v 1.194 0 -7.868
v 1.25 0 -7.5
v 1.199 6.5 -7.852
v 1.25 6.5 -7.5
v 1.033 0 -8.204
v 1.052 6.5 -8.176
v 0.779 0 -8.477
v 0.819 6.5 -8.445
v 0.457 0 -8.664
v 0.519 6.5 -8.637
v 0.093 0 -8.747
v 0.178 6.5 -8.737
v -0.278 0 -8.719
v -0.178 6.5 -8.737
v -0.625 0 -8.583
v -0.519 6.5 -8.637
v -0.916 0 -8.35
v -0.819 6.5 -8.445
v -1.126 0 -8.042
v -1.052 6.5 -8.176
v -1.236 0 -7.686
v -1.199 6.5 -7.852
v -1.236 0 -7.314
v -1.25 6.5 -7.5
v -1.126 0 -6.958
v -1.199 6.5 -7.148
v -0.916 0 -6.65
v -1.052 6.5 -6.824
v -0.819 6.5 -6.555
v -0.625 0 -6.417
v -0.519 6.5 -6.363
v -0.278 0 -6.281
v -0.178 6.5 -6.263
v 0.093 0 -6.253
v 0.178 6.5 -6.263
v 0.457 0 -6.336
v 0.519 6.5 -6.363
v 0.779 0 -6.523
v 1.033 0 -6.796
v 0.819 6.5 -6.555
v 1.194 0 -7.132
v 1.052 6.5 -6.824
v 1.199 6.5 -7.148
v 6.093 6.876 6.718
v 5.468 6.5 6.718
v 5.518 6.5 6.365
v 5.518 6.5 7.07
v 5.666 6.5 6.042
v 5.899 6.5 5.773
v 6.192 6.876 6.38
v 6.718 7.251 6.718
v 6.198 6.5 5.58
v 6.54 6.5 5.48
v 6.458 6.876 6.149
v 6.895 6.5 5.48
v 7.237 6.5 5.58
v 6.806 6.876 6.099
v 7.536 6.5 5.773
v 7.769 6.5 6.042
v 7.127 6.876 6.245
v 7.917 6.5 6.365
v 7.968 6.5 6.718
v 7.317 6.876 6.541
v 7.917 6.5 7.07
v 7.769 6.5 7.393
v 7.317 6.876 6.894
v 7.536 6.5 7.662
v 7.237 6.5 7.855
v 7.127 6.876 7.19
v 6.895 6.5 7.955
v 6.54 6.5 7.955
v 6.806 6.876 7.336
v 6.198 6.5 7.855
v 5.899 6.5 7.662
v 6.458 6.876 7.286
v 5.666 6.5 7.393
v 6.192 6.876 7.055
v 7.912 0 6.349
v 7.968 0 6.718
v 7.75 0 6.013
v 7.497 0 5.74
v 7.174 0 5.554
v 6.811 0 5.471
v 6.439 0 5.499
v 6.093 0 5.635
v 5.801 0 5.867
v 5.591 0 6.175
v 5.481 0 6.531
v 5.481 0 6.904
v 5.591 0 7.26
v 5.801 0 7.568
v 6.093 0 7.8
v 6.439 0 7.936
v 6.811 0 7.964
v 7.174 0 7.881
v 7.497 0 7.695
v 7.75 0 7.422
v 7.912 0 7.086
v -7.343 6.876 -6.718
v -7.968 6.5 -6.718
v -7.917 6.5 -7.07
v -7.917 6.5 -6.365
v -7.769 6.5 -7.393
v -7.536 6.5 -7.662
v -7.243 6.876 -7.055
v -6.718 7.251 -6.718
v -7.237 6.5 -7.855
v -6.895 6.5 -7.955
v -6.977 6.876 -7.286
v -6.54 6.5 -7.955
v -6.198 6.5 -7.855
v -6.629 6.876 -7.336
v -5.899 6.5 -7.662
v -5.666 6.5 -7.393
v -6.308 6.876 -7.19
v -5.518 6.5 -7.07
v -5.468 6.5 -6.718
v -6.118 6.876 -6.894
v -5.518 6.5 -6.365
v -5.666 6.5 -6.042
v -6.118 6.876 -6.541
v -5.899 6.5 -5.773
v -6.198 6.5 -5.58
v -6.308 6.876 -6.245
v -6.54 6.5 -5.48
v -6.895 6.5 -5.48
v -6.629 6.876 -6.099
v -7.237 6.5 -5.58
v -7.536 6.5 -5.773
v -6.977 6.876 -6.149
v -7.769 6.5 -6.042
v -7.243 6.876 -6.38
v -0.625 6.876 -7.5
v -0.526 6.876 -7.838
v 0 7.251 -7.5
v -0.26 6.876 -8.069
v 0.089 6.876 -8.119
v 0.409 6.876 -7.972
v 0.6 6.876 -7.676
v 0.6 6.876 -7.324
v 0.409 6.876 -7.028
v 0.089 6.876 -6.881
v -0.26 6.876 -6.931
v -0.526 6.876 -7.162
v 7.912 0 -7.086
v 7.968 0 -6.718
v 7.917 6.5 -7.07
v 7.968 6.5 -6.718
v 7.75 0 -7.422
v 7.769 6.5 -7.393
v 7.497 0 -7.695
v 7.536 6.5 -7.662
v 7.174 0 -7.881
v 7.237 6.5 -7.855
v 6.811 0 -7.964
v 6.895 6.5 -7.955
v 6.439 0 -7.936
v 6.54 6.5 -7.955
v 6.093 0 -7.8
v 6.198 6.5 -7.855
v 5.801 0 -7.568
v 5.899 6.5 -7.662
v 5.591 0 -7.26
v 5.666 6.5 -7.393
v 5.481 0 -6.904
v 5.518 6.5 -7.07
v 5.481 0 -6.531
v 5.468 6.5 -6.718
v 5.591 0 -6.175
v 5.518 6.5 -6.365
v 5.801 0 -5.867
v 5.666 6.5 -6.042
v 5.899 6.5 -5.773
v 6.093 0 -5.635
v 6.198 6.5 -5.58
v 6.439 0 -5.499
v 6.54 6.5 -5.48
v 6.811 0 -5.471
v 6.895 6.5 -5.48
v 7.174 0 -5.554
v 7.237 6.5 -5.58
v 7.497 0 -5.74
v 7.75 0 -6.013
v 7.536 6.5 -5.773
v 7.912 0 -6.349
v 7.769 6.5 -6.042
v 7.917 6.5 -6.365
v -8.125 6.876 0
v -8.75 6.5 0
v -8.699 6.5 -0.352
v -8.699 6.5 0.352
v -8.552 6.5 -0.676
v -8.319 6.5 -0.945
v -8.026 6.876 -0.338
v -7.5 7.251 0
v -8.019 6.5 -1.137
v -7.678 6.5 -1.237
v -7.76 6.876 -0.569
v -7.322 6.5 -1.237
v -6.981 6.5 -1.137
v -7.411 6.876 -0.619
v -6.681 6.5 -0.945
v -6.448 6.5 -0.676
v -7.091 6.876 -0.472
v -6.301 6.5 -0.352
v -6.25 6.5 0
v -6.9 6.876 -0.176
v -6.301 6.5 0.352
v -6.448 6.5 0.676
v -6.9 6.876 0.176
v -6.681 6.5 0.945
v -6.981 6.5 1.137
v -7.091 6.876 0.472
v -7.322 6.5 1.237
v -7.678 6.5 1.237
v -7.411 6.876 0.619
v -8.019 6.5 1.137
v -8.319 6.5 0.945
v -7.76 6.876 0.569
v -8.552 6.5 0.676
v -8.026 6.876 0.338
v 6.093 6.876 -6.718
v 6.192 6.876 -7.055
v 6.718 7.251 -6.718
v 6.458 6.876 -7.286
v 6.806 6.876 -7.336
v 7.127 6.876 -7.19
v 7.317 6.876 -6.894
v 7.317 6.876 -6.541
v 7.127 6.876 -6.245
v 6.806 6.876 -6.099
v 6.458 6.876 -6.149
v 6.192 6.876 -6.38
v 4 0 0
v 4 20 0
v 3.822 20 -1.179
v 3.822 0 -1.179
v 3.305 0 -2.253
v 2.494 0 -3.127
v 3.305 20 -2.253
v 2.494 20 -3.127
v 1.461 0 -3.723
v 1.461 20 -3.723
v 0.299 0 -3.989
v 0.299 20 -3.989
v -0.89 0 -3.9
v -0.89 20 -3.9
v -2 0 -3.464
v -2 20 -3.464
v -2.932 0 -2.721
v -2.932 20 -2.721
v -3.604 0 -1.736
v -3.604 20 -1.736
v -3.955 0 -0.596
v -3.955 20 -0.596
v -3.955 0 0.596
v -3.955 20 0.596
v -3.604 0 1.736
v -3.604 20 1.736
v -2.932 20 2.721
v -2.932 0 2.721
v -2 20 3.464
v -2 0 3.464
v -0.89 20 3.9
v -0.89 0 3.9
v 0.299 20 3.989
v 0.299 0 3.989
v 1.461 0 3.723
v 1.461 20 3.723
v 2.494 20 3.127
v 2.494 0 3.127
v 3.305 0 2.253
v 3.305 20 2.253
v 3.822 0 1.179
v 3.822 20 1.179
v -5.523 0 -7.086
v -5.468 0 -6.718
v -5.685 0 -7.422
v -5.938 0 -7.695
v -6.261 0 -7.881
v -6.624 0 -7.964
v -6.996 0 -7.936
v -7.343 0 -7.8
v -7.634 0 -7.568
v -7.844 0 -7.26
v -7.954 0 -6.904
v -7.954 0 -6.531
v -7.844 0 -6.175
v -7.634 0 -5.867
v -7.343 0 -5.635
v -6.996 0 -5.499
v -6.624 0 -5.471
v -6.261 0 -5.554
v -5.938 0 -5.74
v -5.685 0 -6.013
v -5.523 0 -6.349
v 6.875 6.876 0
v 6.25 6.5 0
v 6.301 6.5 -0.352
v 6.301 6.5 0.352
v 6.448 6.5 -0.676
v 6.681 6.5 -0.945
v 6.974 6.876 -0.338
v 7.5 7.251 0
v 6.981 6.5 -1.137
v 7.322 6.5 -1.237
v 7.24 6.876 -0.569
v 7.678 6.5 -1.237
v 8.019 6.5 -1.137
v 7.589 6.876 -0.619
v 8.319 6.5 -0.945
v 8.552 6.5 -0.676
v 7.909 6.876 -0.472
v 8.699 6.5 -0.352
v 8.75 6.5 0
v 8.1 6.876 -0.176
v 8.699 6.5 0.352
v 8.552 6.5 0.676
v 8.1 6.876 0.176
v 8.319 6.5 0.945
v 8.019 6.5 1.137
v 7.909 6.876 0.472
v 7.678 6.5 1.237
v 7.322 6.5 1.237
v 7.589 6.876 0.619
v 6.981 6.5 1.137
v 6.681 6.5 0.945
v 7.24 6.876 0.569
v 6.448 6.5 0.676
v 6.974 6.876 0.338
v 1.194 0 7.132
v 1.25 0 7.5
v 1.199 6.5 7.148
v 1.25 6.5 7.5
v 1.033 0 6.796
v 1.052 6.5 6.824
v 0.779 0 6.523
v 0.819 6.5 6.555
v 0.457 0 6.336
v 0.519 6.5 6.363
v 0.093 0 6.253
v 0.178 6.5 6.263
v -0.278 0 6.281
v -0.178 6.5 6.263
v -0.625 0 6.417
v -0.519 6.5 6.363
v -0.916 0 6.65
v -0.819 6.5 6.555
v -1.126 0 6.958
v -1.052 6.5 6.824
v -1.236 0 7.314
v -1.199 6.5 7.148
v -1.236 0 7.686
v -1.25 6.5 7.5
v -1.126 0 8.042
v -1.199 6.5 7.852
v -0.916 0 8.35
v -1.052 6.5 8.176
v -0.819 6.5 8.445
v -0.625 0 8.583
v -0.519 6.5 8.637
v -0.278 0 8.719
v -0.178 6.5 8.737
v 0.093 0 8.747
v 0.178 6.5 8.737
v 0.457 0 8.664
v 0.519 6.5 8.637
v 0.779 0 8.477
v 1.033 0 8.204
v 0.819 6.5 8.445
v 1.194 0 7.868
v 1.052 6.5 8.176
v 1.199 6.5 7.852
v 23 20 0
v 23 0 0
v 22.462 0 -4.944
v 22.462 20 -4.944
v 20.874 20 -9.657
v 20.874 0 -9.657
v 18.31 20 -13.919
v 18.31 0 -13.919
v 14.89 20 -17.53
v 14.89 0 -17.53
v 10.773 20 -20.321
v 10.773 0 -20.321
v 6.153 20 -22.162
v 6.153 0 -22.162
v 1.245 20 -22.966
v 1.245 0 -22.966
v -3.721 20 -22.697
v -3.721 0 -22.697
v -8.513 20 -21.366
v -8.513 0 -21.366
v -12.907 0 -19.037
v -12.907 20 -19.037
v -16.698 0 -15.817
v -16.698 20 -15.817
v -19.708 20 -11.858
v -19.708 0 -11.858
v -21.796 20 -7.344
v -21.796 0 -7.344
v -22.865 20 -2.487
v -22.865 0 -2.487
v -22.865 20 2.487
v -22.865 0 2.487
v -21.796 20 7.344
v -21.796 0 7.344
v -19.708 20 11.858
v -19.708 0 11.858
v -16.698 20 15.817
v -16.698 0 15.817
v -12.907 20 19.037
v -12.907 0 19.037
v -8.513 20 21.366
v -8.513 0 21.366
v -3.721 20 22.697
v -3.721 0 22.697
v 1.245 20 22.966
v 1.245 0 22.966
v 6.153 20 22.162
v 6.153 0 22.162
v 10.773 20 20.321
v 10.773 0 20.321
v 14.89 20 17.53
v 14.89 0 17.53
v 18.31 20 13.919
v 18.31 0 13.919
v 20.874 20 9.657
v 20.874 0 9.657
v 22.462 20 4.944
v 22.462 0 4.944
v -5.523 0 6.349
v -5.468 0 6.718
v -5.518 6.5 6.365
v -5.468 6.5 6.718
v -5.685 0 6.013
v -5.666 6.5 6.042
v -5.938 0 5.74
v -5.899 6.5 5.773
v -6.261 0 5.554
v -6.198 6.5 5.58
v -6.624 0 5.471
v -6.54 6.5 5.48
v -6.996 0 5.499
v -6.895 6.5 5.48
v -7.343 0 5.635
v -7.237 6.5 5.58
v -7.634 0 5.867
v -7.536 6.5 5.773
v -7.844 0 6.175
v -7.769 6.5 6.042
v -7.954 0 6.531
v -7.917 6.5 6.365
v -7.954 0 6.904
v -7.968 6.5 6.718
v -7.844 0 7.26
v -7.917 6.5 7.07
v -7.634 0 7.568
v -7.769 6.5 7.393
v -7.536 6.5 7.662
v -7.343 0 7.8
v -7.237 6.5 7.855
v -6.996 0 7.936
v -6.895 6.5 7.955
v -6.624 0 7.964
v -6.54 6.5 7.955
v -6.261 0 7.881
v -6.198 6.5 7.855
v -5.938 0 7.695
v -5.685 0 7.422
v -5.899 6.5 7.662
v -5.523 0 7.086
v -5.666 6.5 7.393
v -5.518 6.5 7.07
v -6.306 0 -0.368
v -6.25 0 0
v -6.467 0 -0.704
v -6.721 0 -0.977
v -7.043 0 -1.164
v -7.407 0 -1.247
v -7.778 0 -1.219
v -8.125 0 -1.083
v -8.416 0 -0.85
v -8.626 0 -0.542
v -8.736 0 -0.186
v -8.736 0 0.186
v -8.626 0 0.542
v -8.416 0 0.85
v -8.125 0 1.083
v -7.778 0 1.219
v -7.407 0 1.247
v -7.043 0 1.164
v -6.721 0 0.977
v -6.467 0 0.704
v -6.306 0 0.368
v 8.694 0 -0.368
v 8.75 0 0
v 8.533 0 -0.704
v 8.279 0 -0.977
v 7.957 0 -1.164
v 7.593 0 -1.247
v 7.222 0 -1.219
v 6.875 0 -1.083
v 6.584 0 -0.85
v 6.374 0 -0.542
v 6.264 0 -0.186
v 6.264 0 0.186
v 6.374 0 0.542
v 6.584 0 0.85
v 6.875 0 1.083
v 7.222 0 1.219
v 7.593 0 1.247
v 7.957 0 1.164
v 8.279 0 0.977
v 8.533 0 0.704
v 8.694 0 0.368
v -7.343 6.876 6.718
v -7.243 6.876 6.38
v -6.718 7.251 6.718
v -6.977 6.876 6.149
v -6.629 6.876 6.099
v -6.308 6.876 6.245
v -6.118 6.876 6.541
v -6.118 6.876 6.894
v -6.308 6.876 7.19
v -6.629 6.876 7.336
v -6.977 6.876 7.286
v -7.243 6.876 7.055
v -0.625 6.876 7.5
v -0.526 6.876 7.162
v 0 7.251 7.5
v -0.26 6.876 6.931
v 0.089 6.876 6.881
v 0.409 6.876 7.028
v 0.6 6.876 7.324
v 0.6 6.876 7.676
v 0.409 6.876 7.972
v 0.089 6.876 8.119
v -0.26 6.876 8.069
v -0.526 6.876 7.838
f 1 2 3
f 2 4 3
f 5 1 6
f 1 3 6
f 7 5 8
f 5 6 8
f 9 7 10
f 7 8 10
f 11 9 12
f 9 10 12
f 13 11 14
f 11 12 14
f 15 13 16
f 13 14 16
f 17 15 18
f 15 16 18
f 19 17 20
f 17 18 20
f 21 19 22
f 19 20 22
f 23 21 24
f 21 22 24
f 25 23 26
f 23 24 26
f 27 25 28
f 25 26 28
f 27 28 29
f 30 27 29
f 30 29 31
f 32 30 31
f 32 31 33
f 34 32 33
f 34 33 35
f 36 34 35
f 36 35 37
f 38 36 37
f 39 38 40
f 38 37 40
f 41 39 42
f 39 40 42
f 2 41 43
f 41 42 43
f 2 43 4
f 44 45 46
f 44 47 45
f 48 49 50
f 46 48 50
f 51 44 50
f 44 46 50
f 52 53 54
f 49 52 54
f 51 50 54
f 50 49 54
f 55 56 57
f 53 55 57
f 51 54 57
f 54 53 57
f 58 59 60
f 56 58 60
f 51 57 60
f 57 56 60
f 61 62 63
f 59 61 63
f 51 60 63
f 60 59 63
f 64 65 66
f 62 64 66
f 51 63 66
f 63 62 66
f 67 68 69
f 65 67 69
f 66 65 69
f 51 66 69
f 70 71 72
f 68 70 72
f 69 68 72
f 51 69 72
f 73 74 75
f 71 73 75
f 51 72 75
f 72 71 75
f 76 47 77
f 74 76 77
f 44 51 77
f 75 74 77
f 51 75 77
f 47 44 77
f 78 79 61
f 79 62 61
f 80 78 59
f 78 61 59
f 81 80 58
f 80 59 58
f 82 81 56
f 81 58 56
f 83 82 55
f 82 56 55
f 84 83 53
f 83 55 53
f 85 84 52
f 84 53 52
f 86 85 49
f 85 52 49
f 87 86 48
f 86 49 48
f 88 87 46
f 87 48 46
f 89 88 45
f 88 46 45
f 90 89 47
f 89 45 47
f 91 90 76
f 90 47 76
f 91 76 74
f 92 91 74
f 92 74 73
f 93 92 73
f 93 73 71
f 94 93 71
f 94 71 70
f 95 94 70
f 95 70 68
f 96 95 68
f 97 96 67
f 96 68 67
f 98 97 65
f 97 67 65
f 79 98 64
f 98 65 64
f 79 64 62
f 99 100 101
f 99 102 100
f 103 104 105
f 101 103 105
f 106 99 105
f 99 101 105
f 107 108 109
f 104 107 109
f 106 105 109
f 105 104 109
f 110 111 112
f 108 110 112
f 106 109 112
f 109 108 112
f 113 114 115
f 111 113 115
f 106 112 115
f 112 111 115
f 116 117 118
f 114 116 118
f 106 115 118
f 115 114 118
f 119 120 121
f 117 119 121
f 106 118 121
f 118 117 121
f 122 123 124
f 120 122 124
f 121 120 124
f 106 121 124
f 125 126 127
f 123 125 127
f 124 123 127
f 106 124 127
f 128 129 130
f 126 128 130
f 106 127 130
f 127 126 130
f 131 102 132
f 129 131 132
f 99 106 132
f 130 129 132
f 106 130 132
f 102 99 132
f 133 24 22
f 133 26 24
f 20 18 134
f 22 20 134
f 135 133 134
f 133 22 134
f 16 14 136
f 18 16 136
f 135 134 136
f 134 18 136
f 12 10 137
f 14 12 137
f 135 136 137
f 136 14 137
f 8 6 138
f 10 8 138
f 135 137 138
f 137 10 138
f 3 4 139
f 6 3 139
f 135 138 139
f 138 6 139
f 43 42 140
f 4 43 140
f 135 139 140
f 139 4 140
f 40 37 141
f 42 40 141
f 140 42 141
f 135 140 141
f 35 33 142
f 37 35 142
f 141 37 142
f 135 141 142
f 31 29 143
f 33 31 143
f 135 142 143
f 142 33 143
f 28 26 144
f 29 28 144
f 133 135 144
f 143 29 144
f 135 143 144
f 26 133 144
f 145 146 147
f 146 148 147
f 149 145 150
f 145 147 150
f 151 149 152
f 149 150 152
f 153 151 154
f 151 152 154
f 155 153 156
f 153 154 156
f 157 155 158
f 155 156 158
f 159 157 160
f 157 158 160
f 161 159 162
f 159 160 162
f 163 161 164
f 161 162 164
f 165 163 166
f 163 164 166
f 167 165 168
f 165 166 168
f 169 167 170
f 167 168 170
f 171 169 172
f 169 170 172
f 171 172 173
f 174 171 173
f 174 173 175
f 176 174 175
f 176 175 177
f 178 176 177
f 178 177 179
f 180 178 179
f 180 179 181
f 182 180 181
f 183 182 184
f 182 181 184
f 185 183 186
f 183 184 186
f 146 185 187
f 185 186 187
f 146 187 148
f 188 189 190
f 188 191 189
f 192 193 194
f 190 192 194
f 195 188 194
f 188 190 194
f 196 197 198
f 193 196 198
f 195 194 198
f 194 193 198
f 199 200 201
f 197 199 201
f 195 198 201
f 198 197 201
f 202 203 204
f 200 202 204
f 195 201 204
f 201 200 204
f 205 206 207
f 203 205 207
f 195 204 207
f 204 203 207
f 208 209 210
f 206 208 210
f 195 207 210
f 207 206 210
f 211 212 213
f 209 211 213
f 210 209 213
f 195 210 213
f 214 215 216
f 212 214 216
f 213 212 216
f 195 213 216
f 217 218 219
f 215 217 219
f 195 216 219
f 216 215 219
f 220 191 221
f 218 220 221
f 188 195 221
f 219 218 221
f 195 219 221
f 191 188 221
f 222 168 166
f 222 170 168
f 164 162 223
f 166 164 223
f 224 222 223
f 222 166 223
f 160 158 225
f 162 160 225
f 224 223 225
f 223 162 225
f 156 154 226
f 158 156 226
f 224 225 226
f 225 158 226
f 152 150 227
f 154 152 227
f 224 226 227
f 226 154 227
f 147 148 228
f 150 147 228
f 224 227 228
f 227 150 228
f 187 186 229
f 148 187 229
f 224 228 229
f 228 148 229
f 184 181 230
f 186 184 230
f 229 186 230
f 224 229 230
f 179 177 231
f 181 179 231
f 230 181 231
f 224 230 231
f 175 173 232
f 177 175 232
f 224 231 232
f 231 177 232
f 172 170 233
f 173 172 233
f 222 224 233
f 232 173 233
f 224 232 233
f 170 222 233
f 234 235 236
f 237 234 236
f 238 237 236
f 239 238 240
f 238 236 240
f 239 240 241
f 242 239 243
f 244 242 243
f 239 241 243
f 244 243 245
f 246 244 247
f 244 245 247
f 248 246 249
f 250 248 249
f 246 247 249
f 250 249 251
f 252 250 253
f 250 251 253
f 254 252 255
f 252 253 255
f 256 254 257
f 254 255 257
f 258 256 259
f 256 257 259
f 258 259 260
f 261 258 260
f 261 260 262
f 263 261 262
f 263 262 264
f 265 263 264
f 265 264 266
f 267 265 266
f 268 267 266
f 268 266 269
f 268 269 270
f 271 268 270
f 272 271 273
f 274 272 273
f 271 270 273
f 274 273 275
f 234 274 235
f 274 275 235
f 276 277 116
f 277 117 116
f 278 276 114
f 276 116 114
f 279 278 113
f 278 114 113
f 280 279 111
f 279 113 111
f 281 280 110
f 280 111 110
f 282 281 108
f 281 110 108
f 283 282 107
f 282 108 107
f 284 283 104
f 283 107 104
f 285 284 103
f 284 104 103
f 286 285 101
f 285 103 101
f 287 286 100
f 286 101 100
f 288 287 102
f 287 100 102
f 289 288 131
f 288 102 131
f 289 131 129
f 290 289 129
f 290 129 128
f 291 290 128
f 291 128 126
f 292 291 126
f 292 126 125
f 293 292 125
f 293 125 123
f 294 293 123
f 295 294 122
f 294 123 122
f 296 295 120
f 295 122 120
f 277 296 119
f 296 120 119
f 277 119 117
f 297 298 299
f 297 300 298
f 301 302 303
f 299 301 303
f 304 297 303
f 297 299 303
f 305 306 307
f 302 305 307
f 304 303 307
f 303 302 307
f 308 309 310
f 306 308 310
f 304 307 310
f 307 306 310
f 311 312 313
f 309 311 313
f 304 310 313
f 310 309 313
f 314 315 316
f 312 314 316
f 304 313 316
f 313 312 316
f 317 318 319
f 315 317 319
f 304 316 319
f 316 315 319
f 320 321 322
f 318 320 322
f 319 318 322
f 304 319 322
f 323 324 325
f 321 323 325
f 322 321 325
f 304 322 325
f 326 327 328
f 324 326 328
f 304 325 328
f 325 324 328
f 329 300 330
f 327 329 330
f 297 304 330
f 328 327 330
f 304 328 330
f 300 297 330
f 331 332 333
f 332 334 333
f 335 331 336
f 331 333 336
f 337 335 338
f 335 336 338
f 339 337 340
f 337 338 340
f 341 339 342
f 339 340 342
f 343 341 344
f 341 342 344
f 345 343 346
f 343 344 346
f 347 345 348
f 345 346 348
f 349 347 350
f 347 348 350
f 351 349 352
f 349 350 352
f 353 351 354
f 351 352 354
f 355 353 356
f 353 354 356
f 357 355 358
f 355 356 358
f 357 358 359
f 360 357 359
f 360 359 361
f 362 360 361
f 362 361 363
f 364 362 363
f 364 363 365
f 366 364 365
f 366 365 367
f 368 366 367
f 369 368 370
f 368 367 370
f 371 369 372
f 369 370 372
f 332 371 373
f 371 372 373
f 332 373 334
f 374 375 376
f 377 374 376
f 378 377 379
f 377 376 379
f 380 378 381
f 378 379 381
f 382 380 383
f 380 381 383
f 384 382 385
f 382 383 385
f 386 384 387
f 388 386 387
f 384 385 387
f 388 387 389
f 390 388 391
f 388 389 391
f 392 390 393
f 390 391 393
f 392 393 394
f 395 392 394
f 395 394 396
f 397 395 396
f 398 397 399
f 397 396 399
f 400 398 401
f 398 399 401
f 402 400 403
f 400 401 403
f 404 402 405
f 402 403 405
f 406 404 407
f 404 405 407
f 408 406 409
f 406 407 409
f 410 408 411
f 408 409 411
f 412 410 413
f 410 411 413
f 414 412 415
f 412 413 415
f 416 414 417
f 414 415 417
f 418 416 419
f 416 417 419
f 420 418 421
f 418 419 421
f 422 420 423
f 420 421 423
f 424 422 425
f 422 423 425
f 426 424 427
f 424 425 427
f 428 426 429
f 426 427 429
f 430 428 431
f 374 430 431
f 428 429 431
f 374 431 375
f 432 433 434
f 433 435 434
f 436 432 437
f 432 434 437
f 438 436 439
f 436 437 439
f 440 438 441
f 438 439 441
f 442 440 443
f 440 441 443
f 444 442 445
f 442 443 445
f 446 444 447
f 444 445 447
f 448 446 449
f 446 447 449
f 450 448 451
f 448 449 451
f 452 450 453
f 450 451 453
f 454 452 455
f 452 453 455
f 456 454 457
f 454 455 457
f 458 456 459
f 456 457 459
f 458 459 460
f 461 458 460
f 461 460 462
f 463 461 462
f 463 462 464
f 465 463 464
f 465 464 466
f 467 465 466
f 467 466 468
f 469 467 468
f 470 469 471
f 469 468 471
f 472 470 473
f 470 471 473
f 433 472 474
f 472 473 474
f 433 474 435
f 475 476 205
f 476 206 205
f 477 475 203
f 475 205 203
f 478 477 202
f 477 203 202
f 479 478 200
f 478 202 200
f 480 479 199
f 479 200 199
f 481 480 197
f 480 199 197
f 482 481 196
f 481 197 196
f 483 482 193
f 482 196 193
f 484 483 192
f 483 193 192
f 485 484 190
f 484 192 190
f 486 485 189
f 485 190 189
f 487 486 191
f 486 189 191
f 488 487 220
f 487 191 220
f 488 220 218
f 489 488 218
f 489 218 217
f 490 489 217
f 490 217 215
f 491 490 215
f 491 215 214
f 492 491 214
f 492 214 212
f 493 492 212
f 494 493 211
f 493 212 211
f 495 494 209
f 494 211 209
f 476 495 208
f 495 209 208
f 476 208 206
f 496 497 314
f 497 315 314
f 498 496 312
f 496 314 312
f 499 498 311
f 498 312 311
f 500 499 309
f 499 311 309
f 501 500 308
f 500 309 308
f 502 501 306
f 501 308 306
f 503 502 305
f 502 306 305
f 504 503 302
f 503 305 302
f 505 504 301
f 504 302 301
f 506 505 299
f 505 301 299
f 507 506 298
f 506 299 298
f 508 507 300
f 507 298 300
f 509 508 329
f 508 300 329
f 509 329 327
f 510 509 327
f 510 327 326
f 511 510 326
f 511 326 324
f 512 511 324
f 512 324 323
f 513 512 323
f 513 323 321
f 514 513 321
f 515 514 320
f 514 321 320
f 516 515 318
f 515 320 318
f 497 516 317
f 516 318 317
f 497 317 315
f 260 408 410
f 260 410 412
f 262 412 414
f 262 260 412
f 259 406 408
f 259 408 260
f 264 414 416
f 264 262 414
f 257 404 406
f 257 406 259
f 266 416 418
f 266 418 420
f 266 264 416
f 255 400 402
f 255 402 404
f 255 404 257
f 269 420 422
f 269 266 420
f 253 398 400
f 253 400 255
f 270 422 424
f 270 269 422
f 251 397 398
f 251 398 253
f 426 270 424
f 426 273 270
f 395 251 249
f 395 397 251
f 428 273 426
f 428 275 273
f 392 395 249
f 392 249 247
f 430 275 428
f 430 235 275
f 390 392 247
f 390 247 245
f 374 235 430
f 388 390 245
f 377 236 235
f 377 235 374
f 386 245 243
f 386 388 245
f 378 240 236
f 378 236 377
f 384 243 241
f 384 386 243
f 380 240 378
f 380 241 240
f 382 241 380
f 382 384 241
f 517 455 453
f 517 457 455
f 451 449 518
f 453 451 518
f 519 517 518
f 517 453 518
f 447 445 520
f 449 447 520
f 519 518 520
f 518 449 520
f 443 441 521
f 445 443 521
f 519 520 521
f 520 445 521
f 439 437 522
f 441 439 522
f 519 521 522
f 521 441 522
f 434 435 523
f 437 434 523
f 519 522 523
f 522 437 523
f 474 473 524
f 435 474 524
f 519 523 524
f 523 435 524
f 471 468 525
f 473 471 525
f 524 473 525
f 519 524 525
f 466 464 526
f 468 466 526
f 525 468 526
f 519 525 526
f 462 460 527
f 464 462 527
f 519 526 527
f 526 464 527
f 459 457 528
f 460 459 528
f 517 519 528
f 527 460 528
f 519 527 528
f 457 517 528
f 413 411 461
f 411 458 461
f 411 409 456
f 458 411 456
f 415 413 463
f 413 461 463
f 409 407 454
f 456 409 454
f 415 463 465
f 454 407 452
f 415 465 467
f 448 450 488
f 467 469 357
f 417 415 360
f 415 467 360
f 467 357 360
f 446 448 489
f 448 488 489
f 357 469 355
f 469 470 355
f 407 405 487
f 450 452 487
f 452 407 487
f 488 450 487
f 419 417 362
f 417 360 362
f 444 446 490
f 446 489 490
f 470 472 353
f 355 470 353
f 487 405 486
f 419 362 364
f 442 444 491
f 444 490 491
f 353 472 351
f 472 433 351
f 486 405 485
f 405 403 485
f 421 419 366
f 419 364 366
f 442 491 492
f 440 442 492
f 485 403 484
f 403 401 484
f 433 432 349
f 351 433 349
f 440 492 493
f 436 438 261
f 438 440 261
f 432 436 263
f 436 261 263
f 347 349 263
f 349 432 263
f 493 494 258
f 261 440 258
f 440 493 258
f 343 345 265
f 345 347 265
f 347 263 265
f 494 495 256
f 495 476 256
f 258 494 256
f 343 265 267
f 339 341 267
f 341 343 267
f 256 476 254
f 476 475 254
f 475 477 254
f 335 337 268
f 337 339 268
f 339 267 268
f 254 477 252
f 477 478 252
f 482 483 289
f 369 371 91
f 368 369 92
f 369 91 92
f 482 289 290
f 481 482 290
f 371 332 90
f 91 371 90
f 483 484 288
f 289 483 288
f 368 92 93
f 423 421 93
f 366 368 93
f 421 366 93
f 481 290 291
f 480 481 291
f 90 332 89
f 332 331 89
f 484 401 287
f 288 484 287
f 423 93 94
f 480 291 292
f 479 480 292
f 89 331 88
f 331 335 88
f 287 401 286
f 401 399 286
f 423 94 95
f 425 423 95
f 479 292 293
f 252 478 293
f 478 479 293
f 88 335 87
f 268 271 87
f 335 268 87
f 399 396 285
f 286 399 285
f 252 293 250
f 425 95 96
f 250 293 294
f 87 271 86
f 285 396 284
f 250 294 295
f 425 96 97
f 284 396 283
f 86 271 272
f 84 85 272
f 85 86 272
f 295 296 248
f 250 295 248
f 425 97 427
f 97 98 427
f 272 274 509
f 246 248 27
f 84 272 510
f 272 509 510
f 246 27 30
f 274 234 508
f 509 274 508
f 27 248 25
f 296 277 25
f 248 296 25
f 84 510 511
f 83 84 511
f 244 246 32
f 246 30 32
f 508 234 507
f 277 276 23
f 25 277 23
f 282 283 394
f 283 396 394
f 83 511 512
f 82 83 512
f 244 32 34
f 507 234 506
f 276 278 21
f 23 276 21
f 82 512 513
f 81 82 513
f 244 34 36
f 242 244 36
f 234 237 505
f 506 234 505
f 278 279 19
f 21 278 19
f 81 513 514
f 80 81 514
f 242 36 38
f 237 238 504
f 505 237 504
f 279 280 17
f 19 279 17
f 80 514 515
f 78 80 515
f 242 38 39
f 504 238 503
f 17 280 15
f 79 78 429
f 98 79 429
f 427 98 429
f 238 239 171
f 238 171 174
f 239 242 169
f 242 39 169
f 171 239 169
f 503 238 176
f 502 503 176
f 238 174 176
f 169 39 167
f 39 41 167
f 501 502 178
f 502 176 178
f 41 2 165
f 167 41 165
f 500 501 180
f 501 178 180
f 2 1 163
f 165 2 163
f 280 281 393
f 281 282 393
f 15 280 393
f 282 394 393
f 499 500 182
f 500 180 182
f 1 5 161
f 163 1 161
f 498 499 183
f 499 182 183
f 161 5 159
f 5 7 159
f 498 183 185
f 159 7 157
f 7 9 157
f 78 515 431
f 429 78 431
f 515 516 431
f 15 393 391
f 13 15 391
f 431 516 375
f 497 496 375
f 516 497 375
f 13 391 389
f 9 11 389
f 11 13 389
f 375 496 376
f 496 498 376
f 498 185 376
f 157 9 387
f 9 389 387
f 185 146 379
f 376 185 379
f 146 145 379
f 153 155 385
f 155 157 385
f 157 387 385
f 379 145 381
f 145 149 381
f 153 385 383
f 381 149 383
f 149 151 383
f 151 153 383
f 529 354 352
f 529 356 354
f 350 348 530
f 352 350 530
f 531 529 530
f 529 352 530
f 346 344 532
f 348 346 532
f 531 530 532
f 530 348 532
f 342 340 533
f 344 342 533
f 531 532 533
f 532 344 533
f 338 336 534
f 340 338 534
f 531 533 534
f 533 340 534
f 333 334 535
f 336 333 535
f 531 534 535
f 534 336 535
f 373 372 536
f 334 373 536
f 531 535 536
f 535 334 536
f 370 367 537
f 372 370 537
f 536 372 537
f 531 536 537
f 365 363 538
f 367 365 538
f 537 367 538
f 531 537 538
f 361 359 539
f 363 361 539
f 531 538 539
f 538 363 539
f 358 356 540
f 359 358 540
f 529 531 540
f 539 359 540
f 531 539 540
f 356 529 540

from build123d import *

# Parameters (mm, degrees)
SKETCH1_R                 = 23
BOSS_EXTRUDE1_DEPTH       = 20
SKETCH2_R                 = 4
CUT_EXTRUDE1_DEPTH        = 20
M3X0_5_TAPPED_HOLE1_D     = 2.5
M3X0_5_TAPPED_HOLE1_DEPTH = 6.5
M3X0_5_TAPPED_HOLE1_TIP   = 0.751075774


with BuildPart() as part:
    # Sketch1 → Boss-Extrude1 (new body)
    with BuildSketch(Plane(origin=(0, 0, 0), x_dir=(1, 0, 0), z_dir=(0, 1, 0))):
        Circle(SKETCH1_R)
    extrude(amount=BOSS_EXTRUDE1_DEPTH)

    # Sketch2 → Cut-Extrude1 (cut)
    with BuildSketch(Plane(origin=(0, 20, 0), x_dir=(1, 0, 0), z_dir=(0, 1, 0))):
        Circle(SKETCH2_R)
    extrude(amount=-CUT_EXTRUDE1_DEPTH, mode=Mode.SUBTRACT)

    # M3x0.5 Tapped Hole1
    with Locations(Plane(origin=(0, 0, 0), x_dir=(-1, 0, 0), z_dir=(0, -1, 0))):
        with Locations((6.717514421, 6.717514421), (-7.5, 0), (7.5, 0), (0, 7.5), (0, -7.5), (-6.717514421, 6.717514421), (-6.717514421, -6.717514421), (6.717514421, -6.717514421)):
            Hole(M3X0_5_TAPPED_HOLE1_D / 2, depth=M3X0_5_TAPPED_HOLE1_DEPTH)
            with Locations((0, 0, -(M3X0_5_TAPPED_HOLE1_DEPTH + M3X0_5_TAPPED_HOLE1_TIP / 2))):  # 118° drill point
                Cone(0, M3X0_5_TAPPED_HOLE1_D / 2, M3X0_5_TAPPED_HOLE1_TIP, mode=Mode.SUBTRACT)


solid = part.part
